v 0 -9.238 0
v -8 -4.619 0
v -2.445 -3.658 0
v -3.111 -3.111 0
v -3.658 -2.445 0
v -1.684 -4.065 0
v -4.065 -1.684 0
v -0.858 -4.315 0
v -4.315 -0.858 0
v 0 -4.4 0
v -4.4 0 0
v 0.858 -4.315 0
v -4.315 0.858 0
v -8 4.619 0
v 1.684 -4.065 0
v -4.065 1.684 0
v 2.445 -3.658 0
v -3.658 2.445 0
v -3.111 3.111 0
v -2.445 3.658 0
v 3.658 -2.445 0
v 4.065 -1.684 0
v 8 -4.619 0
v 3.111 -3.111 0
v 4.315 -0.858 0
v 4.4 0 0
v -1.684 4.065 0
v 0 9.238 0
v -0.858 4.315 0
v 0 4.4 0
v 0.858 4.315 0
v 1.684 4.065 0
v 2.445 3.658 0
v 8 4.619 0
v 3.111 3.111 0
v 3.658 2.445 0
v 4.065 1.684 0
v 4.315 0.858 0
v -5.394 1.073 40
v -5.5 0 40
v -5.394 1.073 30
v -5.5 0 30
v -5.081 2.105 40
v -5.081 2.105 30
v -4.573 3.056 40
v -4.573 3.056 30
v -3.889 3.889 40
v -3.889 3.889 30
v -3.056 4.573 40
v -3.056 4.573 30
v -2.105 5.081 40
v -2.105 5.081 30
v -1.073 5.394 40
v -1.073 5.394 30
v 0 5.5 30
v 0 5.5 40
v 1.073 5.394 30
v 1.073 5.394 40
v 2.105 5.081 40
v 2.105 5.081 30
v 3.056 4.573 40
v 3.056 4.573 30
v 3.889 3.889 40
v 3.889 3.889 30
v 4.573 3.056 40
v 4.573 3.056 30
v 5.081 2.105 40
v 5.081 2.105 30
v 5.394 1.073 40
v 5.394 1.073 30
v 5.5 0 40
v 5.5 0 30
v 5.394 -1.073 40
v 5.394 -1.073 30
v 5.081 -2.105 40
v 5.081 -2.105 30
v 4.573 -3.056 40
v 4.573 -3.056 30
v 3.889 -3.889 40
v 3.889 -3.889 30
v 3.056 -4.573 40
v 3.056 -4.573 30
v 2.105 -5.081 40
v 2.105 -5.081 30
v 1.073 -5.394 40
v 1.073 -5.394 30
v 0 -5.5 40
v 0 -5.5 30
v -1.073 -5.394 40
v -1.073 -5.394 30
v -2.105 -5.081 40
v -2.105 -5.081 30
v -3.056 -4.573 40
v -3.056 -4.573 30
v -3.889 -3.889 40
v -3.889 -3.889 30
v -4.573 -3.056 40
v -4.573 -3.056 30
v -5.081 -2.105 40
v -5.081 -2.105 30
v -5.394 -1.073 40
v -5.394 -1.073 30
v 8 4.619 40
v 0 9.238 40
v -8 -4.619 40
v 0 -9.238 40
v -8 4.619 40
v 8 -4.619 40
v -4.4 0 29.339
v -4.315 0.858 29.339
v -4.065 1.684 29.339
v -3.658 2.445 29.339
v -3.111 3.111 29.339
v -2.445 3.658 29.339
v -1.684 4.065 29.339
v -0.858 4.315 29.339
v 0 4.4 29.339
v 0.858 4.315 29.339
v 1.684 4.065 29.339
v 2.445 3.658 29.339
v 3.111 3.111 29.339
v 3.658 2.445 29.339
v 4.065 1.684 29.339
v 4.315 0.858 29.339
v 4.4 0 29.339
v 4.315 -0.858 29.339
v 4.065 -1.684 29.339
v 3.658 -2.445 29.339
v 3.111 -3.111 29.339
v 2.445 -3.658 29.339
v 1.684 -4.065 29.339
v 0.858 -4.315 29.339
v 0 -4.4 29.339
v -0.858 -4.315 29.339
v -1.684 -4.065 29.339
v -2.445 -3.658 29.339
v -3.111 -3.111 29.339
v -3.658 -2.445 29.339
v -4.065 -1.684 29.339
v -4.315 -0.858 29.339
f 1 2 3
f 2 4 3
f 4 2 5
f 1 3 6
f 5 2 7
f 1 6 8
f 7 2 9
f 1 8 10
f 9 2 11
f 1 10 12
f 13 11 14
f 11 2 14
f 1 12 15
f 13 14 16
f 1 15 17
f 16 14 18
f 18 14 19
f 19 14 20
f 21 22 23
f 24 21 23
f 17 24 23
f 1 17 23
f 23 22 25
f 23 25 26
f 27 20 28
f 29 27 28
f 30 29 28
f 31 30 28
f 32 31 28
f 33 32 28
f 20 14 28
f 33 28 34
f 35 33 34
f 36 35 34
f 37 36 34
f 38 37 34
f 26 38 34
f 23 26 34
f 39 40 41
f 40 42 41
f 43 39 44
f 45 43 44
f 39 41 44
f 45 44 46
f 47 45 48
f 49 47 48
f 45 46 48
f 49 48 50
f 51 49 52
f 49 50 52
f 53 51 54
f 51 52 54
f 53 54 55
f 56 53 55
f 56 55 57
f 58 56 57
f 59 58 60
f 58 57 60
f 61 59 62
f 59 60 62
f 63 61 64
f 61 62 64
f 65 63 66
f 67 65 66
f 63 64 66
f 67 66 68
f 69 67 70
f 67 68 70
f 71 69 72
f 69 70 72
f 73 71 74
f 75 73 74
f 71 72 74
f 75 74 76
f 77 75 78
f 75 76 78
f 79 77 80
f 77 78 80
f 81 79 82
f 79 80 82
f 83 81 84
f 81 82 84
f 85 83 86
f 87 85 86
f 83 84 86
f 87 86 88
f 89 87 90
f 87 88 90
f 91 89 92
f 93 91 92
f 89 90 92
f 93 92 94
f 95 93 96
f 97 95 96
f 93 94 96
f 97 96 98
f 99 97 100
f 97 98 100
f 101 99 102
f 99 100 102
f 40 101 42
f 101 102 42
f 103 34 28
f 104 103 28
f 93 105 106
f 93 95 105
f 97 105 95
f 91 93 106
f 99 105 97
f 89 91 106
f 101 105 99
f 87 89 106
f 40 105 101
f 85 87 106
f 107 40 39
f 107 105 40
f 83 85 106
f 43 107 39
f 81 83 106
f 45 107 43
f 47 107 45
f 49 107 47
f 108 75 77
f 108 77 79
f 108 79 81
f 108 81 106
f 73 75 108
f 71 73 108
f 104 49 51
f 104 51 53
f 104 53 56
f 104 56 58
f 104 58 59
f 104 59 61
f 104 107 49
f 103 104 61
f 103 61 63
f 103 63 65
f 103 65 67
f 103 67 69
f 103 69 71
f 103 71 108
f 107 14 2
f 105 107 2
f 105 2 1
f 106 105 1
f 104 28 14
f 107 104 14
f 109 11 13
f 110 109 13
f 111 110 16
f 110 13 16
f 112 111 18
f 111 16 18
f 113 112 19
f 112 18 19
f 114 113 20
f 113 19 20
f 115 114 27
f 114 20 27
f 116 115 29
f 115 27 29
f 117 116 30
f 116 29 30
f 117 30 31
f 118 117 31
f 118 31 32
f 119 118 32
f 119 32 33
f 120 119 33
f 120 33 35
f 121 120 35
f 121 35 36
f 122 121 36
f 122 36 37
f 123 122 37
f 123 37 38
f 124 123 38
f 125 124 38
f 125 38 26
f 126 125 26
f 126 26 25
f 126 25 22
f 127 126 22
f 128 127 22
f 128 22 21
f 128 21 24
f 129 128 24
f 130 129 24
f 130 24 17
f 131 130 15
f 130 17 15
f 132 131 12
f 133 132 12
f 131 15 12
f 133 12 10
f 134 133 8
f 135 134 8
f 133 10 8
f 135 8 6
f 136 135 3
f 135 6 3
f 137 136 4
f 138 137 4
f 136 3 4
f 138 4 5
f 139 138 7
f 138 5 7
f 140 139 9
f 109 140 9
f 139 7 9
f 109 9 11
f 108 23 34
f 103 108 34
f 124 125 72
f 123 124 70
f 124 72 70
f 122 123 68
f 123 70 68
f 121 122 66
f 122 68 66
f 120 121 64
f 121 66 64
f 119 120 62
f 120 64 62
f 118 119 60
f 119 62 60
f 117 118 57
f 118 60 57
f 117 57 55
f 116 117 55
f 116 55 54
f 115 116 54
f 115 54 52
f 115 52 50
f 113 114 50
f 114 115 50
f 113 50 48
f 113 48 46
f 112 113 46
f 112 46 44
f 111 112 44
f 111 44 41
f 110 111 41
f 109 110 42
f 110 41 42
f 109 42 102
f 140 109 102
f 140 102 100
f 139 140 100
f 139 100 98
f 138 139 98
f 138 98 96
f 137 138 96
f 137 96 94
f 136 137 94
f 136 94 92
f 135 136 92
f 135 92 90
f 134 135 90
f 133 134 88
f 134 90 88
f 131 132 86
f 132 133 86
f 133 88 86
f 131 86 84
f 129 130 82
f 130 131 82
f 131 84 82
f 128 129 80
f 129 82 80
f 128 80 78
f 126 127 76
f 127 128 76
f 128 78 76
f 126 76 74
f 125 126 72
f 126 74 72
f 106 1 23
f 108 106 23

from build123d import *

# Parameters (mm, degrees)
F1_DEPTH = 40
F3_D     = 11
F3_DEPTH = 10
F3_TIP   = 3.3047334047
F4_D     = 8.8


with BuildPart() as f1:
    # F0 (on Top) → F1 (new body)
    with BuildSketch(Plane.XY):
        Polygon((8, -4.6188021535), (8, 4.6188021535), (0, 9.237604307), (-8, 4.6188021535), (-8, -4.6188021535), (0, -9.237604307), align=None)
    extrude(amount=F1_DEPTH)

    # F3
    with Locations(Plane.XY.offset(40)):
        with Locations((0, 0)):
            Hole(F3_D / 2, depth=F3_DEPTH)
            with Locations((0, 0, -(F3_DEPTH + F3_TIP / 2))):  # 118° drill point
                Cone(0, F3_D / 2, F3_TIP, mode=Mode.SUBTRACT)

    # F4 (through all)
    with Locations(Plane.XY.offset(40)):
        with Locations((0, 0)):
            Hole(F4_D / 2)


solid = f1.part
